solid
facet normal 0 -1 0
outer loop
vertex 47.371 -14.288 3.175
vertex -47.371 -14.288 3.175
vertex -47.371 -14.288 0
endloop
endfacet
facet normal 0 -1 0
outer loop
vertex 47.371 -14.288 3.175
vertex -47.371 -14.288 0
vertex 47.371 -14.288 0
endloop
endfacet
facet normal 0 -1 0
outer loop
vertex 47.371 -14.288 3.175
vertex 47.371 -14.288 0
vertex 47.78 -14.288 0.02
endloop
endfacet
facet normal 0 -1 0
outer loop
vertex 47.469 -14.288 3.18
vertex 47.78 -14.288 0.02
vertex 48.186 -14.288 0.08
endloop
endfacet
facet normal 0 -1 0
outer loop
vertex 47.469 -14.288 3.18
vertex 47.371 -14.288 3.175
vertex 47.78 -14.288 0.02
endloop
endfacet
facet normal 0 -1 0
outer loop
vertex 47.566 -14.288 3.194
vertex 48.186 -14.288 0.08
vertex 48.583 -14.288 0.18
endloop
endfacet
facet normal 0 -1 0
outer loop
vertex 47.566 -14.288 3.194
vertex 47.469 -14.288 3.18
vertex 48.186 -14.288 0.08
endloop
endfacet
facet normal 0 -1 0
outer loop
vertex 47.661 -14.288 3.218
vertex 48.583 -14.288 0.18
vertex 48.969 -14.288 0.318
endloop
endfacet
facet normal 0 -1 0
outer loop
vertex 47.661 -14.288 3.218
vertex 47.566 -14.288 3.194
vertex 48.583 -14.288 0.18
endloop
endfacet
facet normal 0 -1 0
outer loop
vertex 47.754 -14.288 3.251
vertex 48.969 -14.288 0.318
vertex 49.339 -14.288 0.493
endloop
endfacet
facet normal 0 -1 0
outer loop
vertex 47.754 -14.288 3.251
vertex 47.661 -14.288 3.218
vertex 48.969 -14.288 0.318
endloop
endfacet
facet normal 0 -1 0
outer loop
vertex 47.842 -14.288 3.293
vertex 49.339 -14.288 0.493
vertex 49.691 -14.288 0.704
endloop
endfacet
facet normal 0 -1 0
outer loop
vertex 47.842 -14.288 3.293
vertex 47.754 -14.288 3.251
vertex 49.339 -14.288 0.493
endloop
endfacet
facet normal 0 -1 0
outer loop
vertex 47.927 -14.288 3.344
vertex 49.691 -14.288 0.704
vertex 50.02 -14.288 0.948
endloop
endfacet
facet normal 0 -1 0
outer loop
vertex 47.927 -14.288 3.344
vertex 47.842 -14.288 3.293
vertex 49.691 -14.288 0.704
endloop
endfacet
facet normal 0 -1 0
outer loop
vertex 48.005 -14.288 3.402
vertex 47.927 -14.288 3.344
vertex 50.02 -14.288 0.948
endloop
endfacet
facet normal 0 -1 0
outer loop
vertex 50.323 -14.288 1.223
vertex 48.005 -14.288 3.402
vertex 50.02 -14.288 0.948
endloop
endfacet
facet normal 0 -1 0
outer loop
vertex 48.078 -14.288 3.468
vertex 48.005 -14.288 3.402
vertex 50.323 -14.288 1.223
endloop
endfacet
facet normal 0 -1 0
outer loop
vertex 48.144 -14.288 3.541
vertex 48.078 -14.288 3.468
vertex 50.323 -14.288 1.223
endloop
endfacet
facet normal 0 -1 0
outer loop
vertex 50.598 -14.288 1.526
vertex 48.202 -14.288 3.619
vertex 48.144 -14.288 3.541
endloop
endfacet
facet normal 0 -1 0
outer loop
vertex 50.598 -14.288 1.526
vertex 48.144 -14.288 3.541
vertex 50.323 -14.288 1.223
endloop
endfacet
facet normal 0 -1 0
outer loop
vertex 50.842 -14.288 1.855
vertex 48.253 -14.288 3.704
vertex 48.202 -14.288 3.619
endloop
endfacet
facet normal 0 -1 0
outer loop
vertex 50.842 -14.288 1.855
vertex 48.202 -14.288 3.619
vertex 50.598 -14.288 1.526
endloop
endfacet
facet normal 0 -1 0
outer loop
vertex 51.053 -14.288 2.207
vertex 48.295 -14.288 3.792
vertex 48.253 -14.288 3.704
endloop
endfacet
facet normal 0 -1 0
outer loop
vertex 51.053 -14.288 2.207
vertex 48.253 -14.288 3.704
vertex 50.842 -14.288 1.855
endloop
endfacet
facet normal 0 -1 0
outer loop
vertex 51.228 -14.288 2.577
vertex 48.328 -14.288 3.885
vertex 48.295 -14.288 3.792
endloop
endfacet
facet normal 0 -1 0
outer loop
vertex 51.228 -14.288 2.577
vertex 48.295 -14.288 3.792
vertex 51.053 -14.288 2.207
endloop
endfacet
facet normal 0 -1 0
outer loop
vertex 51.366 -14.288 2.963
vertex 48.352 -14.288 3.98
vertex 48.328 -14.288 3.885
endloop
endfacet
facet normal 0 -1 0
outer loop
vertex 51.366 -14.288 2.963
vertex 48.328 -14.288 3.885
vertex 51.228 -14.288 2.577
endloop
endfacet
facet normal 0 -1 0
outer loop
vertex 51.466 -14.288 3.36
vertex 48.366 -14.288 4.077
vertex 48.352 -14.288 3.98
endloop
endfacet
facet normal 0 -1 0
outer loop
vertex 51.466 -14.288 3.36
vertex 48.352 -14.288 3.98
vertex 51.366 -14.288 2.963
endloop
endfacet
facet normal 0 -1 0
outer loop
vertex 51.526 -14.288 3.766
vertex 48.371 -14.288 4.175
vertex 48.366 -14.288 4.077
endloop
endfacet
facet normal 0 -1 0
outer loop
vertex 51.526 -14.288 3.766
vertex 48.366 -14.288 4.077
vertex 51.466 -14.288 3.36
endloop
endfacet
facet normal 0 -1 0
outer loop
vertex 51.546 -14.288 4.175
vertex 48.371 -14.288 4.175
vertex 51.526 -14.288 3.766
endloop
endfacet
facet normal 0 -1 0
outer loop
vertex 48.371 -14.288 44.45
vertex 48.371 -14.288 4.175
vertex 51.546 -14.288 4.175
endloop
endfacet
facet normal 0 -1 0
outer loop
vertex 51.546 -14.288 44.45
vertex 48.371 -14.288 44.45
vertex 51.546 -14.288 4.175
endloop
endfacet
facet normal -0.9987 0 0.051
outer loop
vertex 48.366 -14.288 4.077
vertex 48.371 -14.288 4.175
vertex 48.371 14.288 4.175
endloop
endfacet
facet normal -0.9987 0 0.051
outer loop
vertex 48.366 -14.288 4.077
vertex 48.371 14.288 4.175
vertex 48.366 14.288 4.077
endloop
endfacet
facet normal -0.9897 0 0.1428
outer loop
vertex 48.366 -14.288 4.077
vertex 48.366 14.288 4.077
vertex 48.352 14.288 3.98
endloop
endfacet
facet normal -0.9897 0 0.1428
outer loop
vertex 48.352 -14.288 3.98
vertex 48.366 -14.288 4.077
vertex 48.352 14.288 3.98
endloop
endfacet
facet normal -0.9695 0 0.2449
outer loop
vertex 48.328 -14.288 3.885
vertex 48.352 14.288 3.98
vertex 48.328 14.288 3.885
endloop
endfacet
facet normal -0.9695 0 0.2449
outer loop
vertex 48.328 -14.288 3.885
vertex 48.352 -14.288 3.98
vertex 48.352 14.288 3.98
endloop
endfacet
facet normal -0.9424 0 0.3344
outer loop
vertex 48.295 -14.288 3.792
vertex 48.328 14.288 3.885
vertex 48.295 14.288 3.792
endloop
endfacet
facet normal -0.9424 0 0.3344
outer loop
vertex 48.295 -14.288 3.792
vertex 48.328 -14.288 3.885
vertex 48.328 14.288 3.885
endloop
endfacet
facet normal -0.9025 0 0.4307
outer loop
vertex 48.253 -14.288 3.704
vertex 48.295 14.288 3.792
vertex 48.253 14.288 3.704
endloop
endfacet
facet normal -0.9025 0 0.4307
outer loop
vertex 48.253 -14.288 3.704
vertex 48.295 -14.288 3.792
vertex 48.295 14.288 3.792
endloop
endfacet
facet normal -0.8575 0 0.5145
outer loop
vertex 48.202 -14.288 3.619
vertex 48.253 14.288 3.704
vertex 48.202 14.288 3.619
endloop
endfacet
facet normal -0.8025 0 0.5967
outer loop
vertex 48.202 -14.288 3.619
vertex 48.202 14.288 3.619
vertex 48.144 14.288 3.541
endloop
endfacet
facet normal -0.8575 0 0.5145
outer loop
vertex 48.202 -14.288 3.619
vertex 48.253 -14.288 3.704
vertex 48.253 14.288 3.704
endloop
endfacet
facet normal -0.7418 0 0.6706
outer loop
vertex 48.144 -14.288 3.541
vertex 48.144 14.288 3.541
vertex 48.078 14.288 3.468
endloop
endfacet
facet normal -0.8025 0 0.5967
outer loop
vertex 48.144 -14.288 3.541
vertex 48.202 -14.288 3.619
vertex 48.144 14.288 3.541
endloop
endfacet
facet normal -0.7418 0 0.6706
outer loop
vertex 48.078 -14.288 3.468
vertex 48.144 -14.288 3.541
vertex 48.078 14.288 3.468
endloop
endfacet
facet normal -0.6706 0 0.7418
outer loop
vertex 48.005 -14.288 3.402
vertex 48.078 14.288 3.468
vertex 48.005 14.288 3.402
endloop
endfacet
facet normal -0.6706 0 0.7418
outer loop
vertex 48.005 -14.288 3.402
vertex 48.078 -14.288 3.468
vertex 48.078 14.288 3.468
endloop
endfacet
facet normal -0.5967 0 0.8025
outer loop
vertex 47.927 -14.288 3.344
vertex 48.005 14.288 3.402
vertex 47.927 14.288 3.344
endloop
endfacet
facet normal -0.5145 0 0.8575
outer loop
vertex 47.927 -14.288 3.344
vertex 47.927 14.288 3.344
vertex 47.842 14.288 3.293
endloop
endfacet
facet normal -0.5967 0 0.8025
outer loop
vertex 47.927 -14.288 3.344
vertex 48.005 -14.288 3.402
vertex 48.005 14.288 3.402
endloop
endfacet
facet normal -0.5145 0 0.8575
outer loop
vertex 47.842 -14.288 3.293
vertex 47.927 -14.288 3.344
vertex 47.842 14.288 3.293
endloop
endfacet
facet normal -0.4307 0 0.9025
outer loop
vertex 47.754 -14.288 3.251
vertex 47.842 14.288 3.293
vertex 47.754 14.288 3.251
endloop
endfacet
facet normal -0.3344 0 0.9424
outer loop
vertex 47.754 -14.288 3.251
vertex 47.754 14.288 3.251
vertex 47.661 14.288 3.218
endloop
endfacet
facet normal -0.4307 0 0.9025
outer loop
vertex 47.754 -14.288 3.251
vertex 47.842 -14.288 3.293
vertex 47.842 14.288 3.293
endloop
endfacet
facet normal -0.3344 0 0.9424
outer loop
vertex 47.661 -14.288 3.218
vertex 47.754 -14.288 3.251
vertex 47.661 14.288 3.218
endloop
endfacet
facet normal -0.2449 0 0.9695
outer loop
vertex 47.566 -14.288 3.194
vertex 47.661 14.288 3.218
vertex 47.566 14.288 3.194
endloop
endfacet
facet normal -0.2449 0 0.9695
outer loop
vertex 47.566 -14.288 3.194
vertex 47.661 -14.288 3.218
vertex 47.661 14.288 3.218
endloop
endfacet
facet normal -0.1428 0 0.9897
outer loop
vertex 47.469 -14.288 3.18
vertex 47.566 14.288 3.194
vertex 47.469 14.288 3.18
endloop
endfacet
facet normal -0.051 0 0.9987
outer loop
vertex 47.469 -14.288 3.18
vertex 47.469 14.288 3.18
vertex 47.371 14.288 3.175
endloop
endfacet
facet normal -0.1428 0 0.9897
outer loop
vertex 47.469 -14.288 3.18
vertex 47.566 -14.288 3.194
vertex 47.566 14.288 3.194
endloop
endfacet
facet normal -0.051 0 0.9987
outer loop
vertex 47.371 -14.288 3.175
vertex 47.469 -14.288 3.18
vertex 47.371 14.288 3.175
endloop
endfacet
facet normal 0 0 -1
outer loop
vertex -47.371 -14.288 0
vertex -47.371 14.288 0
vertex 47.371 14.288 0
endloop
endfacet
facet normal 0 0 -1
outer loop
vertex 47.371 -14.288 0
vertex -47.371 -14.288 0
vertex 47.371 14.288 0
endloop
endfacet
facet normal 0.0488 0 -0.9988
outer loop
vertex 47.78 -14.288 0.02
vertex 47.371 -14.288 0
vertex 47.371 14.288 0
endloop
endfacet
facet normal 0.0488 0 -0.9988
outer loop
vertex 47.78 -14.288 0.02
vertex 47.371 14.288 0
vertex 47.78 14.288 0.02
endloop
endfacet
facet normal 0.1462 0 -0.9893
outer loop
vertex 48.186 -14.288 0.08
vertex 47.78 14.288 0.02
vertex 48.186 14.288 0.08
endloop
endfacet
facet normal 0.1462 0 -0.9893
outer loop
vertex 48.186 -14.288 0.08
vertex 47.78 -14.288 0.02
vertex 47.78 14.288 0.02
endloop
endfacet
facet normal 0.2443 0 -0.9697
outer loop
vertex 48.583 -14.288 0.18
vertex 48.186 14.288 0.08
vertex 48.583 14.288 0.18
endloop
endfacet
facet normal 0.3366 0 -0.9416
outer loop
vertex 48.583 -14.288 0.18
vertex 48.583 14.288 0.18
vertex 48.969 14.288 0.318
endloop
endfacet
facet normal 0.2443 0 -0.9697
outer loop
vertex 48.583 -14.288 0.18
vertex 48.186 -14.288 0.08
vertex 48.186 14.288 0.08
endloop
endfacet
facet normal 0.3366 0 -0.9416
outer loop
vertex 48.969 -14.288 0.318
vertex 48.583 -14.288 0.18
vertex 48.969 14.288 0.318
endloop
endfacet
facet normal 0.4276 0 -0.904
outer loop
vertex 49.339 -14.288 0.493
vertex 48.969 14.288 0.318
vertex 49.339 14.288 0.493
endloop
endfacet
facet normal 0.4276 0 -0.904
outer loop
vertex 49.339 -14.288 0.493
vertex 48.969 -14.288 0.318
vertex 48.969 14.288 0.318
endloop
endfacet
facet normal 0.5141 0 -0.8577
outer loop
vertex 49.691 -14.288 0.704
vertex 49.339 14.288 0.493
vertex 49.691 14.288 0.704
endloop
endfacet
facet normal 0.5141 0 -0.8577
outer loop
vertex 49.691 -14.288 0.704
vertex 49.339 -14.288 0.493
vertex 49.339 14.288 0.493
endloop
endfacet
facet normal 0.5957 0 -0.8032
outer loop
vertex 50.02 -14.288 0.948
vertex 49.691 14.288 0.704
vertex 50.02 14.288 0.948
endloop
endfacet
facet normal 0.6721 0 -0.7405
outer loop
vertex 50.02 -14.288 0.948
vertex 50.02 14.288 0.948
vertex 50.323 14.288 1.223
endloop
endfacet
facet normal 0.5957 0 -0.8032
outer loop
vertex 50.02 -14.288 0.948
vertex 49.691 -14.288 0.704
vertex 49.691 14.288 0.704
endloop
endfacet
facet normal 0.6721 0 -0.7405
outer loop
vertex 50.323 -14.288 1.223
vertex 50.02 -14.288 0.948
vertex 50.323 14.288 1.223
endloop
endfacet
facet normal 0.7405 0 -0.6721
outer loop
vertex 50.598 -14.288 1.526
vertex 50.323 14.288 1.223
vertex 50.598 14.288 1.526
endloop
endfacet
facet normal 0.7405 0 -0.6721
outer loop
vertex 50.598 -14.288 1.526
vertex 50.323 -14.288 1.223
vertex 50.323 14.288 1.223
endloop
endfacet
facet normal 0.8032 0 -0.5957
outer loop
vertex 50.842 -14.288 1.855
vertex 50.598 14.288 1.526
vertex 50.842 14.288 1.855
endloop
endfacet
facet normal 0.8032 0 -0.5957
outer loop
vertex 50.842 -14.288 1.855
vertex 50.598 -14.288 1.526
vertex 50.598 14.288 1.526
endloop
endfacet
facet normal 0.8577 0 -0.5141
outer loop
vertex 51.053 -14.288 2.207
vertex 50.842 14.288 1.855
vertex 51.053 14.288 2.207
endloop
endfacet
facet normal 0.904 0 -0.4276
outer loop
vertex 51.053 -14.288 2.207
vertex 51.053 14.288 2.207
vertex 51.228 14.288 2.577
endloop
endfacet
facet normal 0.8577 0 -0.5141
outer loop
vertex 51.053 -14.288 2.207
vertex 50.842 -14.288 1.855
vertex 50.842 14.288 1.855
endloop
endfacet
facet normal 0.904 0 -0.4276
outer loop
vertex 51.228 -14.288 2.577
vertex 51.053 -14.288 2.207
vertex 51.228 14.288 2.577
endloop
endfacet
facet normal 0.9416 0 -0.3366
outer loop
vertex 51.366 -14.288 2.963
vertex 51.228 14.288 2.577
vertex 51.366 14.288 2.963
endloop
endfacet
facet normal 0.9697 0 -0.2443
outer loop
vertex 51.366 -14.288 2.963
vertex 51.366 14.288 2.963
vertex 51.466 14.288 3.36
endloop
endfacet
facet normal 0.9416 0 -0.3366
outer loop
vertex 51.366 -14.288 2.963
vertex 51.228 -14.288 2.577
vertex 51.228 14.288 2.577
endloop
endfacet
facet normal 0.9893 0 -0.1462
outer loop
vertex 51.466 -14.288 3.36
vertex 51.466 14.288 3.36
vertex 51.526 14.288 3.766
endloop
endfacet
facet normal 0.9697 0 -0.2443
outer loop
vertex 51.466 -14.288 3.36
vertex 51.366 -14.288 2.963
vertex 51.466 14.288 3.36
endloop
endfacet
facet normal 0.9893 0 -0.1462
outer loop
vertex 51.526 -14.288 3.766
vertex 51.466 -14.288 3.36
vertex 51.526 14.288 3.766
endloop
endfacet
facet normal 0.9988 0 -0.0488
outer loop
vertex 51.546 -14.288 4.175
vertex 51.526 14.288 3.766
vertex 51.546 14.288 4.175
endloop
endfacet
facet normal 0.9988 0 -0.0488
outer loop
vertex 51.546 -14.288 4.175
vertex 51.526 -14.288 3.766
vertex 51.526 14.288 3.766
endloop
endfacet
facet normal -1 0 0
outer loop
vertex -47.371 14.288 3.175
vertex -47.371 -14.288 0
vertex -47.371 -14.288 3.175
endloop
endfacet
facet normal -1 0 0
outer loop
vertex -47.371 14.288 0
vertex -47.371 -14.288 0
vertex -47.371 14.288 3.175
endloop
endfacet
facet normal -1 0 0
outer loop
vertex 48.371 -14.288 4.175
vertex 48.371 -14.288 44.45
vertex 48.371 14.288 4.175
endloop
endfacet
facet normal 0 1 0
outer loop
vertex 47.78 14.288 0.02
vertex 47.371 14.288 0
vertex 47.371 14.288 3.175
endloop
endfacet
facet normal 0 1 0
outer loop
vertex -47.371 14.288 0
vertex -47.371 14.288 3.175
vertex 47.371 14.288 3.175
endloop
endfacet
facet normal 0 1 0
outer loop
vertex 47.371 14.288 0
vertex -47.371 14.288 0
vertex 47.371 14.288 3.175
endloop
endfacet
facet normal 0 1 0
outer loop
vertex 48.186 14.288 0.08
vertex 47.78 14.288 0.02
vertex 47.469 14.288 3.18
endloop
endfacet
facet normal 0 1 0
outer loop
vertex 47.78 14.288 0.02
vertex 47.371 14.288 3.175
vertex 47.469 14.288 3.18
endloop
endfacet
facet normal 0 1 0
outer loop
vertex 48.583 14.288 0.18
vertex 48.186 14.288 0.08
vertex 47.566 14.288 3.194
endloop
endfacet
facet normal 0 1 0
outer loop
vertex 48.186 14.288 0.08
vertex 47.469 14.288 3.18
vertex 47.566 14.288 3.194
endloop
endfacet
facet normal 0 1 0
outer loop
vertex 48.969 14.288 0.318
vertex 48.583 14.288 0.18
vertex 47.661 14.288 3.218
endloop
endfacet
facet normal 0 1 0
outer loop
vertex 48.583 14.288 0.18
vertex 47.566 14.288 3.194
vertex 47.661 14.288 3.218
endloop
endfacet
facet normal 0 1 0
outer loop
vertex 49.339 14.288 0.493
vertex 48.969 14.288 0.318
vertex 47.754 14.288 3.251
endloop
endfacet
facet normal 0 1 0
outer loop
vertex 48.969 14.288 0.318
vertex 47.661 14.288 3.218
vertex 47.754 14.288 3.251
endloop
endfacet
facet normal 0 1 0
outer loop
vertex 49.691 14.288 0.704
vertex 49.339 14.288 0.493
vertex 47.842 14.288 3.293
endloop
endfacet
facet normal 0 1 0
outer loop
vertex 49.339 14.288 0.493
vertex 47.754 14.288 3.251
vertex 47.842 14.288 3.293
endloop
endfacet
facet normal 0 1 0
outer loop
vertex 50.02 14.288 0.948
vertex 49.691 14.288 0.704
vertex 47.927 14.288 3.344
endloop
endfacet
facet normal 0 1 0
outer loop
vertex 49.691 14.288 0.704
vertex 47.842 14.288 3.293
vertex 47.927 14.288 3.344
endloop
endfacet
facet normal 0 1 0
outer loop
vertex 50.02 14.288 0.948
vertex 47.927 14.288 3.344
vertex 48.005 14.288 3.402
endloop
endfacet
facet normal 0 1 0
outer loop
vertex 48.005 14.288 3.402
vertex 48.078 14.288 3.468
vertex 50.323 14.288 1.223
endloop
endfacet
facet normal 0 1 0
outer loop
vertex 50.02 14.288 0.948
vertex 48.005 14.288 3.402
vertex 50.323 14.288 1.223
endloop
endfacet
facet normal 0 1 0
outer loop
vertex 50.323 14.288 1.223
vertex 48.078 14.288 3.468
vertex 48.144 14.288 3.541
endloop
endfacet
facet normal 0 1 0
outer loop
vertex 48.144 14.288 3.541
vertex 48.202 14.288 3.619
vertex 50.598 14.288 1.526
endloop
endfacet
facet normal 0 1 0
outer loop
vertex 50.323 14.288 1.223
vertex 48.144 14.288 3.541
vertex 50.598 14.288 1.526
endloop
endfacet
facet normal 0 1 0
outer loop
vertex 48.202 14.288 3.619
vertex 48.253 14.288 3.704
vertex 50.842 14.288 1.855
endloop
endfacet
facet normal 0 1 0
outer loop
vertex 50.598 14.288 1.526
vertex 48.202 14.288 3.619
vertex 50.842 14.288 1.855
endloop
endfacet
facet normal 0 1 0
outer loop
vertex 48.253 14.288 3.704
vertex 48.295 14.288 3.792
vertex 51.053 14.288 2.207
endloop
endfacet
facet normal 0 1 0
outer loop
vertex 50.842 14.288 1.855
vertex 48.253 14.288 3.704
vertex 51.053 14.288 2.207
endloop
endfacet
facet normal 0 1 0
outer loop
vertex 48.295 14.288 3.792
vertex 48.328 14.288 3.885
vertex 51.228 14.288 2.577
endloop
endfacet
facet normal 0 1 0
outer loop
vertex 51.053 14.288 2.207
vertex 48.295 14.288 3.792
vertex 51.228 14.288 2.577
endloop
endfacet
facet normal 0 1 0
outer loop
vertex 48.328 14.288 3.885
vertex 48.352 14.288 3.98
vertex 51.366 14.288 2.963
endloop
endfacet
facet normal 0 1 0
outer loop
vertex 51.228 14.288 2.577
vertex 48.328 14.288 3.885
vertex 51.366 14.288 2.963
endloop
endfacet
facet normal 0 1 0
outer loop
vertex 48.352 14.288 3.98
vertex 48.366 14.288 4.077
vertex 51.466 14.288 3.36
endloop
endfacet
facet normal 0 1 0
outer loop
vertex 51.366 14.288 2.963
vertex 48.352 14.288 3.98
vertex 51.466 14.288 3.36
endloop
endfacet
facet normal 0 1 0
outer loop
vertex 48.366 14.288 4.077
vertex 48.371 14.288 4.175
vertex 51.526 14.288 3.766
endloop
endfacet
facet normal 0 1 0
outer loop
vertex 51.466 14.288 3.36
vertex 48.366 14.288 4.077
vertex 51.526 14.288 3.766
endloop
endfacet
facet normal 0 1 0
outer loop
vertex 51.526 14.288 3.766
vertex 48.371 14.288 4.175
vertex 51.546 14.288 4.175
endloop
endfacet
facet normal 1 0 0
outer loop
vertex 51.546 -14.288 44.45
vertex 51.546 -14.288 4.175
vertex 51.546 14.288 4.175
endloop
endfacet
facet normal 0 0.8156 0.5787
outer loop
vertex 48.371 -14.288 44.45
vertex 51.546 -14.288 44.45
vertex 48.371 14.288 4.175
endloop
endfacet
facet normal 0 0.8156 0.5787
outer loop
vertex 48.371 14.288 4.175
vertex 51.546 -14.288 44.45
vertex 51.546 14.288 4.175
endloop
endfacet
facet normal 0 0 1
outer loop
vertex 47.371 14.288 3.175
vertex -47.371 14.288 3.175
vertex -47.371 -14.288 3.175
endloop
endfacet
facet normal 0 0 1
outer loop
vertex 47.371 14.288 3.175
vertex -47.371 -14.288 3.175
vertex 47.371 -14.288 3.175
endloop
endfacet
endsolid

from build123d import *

# Parameters (mm, degrees)
SKETCH2_W          = 94.742
SKETCH2_H          = 28.575
BASE_FLANGE1_DEPTH = 3.175
EDGE_FLANGE1_DEPTH = 28.575
CUT_EXTRUDE2_DEPTH = 3.175


# Sheet-metal steps are written as plain solids
with BuildPart() as part:
    # Sketch2 → Base-Flange1 (new body)
    with BuildSketch(Plane.XY):
        Rectangle(SKETCH2_W, SKETCH2_H)
    extrude(amount=BASE_FLANGE1_DEPTH)

    # Edge-Flange1 section (across the edge) → Edge-Flange1 (add)
    with BuildSketch(Plane(origin=(48.371, -14.2875, 3.175), x_dir=(-1, 0, 0), z_dir=(0, 1, 0))):
        with BuildLine():
            Line((-3.175, 1), (-3.175, 41.275))
            Line((-3.175, 41.275), (0, 41.275))
            Line((0, 41.275), (0, 1))
            ThreePointArc((0, 1), (0.292893219, 0.292893219), (1, 0))
            Line((1, 0), (1, -3.175))
            ThreePointArc((1, -3.175), (-1.952170811, -1.952170811), (-3.175, 1))
        make_face()
    extrude(amount=EDGE_FLANGE1_DEPTH)

    # Sketch11 → Cut-Extrude2 (cut)
    with BuildSketch(Plane(origin=(51.546, 0, 0), x_dir=(0, 0, -1), z_dir=(1, 0, 0))):
        Polygon((-44.45, -14.2875), (-4.175, 14.2875), (-44.45, 14.2875), align=None)
    extrude(amount=-CUT_EXTRUDE2_DEPTH, mode=Mode.SUBTRACT)


solid = part.part
